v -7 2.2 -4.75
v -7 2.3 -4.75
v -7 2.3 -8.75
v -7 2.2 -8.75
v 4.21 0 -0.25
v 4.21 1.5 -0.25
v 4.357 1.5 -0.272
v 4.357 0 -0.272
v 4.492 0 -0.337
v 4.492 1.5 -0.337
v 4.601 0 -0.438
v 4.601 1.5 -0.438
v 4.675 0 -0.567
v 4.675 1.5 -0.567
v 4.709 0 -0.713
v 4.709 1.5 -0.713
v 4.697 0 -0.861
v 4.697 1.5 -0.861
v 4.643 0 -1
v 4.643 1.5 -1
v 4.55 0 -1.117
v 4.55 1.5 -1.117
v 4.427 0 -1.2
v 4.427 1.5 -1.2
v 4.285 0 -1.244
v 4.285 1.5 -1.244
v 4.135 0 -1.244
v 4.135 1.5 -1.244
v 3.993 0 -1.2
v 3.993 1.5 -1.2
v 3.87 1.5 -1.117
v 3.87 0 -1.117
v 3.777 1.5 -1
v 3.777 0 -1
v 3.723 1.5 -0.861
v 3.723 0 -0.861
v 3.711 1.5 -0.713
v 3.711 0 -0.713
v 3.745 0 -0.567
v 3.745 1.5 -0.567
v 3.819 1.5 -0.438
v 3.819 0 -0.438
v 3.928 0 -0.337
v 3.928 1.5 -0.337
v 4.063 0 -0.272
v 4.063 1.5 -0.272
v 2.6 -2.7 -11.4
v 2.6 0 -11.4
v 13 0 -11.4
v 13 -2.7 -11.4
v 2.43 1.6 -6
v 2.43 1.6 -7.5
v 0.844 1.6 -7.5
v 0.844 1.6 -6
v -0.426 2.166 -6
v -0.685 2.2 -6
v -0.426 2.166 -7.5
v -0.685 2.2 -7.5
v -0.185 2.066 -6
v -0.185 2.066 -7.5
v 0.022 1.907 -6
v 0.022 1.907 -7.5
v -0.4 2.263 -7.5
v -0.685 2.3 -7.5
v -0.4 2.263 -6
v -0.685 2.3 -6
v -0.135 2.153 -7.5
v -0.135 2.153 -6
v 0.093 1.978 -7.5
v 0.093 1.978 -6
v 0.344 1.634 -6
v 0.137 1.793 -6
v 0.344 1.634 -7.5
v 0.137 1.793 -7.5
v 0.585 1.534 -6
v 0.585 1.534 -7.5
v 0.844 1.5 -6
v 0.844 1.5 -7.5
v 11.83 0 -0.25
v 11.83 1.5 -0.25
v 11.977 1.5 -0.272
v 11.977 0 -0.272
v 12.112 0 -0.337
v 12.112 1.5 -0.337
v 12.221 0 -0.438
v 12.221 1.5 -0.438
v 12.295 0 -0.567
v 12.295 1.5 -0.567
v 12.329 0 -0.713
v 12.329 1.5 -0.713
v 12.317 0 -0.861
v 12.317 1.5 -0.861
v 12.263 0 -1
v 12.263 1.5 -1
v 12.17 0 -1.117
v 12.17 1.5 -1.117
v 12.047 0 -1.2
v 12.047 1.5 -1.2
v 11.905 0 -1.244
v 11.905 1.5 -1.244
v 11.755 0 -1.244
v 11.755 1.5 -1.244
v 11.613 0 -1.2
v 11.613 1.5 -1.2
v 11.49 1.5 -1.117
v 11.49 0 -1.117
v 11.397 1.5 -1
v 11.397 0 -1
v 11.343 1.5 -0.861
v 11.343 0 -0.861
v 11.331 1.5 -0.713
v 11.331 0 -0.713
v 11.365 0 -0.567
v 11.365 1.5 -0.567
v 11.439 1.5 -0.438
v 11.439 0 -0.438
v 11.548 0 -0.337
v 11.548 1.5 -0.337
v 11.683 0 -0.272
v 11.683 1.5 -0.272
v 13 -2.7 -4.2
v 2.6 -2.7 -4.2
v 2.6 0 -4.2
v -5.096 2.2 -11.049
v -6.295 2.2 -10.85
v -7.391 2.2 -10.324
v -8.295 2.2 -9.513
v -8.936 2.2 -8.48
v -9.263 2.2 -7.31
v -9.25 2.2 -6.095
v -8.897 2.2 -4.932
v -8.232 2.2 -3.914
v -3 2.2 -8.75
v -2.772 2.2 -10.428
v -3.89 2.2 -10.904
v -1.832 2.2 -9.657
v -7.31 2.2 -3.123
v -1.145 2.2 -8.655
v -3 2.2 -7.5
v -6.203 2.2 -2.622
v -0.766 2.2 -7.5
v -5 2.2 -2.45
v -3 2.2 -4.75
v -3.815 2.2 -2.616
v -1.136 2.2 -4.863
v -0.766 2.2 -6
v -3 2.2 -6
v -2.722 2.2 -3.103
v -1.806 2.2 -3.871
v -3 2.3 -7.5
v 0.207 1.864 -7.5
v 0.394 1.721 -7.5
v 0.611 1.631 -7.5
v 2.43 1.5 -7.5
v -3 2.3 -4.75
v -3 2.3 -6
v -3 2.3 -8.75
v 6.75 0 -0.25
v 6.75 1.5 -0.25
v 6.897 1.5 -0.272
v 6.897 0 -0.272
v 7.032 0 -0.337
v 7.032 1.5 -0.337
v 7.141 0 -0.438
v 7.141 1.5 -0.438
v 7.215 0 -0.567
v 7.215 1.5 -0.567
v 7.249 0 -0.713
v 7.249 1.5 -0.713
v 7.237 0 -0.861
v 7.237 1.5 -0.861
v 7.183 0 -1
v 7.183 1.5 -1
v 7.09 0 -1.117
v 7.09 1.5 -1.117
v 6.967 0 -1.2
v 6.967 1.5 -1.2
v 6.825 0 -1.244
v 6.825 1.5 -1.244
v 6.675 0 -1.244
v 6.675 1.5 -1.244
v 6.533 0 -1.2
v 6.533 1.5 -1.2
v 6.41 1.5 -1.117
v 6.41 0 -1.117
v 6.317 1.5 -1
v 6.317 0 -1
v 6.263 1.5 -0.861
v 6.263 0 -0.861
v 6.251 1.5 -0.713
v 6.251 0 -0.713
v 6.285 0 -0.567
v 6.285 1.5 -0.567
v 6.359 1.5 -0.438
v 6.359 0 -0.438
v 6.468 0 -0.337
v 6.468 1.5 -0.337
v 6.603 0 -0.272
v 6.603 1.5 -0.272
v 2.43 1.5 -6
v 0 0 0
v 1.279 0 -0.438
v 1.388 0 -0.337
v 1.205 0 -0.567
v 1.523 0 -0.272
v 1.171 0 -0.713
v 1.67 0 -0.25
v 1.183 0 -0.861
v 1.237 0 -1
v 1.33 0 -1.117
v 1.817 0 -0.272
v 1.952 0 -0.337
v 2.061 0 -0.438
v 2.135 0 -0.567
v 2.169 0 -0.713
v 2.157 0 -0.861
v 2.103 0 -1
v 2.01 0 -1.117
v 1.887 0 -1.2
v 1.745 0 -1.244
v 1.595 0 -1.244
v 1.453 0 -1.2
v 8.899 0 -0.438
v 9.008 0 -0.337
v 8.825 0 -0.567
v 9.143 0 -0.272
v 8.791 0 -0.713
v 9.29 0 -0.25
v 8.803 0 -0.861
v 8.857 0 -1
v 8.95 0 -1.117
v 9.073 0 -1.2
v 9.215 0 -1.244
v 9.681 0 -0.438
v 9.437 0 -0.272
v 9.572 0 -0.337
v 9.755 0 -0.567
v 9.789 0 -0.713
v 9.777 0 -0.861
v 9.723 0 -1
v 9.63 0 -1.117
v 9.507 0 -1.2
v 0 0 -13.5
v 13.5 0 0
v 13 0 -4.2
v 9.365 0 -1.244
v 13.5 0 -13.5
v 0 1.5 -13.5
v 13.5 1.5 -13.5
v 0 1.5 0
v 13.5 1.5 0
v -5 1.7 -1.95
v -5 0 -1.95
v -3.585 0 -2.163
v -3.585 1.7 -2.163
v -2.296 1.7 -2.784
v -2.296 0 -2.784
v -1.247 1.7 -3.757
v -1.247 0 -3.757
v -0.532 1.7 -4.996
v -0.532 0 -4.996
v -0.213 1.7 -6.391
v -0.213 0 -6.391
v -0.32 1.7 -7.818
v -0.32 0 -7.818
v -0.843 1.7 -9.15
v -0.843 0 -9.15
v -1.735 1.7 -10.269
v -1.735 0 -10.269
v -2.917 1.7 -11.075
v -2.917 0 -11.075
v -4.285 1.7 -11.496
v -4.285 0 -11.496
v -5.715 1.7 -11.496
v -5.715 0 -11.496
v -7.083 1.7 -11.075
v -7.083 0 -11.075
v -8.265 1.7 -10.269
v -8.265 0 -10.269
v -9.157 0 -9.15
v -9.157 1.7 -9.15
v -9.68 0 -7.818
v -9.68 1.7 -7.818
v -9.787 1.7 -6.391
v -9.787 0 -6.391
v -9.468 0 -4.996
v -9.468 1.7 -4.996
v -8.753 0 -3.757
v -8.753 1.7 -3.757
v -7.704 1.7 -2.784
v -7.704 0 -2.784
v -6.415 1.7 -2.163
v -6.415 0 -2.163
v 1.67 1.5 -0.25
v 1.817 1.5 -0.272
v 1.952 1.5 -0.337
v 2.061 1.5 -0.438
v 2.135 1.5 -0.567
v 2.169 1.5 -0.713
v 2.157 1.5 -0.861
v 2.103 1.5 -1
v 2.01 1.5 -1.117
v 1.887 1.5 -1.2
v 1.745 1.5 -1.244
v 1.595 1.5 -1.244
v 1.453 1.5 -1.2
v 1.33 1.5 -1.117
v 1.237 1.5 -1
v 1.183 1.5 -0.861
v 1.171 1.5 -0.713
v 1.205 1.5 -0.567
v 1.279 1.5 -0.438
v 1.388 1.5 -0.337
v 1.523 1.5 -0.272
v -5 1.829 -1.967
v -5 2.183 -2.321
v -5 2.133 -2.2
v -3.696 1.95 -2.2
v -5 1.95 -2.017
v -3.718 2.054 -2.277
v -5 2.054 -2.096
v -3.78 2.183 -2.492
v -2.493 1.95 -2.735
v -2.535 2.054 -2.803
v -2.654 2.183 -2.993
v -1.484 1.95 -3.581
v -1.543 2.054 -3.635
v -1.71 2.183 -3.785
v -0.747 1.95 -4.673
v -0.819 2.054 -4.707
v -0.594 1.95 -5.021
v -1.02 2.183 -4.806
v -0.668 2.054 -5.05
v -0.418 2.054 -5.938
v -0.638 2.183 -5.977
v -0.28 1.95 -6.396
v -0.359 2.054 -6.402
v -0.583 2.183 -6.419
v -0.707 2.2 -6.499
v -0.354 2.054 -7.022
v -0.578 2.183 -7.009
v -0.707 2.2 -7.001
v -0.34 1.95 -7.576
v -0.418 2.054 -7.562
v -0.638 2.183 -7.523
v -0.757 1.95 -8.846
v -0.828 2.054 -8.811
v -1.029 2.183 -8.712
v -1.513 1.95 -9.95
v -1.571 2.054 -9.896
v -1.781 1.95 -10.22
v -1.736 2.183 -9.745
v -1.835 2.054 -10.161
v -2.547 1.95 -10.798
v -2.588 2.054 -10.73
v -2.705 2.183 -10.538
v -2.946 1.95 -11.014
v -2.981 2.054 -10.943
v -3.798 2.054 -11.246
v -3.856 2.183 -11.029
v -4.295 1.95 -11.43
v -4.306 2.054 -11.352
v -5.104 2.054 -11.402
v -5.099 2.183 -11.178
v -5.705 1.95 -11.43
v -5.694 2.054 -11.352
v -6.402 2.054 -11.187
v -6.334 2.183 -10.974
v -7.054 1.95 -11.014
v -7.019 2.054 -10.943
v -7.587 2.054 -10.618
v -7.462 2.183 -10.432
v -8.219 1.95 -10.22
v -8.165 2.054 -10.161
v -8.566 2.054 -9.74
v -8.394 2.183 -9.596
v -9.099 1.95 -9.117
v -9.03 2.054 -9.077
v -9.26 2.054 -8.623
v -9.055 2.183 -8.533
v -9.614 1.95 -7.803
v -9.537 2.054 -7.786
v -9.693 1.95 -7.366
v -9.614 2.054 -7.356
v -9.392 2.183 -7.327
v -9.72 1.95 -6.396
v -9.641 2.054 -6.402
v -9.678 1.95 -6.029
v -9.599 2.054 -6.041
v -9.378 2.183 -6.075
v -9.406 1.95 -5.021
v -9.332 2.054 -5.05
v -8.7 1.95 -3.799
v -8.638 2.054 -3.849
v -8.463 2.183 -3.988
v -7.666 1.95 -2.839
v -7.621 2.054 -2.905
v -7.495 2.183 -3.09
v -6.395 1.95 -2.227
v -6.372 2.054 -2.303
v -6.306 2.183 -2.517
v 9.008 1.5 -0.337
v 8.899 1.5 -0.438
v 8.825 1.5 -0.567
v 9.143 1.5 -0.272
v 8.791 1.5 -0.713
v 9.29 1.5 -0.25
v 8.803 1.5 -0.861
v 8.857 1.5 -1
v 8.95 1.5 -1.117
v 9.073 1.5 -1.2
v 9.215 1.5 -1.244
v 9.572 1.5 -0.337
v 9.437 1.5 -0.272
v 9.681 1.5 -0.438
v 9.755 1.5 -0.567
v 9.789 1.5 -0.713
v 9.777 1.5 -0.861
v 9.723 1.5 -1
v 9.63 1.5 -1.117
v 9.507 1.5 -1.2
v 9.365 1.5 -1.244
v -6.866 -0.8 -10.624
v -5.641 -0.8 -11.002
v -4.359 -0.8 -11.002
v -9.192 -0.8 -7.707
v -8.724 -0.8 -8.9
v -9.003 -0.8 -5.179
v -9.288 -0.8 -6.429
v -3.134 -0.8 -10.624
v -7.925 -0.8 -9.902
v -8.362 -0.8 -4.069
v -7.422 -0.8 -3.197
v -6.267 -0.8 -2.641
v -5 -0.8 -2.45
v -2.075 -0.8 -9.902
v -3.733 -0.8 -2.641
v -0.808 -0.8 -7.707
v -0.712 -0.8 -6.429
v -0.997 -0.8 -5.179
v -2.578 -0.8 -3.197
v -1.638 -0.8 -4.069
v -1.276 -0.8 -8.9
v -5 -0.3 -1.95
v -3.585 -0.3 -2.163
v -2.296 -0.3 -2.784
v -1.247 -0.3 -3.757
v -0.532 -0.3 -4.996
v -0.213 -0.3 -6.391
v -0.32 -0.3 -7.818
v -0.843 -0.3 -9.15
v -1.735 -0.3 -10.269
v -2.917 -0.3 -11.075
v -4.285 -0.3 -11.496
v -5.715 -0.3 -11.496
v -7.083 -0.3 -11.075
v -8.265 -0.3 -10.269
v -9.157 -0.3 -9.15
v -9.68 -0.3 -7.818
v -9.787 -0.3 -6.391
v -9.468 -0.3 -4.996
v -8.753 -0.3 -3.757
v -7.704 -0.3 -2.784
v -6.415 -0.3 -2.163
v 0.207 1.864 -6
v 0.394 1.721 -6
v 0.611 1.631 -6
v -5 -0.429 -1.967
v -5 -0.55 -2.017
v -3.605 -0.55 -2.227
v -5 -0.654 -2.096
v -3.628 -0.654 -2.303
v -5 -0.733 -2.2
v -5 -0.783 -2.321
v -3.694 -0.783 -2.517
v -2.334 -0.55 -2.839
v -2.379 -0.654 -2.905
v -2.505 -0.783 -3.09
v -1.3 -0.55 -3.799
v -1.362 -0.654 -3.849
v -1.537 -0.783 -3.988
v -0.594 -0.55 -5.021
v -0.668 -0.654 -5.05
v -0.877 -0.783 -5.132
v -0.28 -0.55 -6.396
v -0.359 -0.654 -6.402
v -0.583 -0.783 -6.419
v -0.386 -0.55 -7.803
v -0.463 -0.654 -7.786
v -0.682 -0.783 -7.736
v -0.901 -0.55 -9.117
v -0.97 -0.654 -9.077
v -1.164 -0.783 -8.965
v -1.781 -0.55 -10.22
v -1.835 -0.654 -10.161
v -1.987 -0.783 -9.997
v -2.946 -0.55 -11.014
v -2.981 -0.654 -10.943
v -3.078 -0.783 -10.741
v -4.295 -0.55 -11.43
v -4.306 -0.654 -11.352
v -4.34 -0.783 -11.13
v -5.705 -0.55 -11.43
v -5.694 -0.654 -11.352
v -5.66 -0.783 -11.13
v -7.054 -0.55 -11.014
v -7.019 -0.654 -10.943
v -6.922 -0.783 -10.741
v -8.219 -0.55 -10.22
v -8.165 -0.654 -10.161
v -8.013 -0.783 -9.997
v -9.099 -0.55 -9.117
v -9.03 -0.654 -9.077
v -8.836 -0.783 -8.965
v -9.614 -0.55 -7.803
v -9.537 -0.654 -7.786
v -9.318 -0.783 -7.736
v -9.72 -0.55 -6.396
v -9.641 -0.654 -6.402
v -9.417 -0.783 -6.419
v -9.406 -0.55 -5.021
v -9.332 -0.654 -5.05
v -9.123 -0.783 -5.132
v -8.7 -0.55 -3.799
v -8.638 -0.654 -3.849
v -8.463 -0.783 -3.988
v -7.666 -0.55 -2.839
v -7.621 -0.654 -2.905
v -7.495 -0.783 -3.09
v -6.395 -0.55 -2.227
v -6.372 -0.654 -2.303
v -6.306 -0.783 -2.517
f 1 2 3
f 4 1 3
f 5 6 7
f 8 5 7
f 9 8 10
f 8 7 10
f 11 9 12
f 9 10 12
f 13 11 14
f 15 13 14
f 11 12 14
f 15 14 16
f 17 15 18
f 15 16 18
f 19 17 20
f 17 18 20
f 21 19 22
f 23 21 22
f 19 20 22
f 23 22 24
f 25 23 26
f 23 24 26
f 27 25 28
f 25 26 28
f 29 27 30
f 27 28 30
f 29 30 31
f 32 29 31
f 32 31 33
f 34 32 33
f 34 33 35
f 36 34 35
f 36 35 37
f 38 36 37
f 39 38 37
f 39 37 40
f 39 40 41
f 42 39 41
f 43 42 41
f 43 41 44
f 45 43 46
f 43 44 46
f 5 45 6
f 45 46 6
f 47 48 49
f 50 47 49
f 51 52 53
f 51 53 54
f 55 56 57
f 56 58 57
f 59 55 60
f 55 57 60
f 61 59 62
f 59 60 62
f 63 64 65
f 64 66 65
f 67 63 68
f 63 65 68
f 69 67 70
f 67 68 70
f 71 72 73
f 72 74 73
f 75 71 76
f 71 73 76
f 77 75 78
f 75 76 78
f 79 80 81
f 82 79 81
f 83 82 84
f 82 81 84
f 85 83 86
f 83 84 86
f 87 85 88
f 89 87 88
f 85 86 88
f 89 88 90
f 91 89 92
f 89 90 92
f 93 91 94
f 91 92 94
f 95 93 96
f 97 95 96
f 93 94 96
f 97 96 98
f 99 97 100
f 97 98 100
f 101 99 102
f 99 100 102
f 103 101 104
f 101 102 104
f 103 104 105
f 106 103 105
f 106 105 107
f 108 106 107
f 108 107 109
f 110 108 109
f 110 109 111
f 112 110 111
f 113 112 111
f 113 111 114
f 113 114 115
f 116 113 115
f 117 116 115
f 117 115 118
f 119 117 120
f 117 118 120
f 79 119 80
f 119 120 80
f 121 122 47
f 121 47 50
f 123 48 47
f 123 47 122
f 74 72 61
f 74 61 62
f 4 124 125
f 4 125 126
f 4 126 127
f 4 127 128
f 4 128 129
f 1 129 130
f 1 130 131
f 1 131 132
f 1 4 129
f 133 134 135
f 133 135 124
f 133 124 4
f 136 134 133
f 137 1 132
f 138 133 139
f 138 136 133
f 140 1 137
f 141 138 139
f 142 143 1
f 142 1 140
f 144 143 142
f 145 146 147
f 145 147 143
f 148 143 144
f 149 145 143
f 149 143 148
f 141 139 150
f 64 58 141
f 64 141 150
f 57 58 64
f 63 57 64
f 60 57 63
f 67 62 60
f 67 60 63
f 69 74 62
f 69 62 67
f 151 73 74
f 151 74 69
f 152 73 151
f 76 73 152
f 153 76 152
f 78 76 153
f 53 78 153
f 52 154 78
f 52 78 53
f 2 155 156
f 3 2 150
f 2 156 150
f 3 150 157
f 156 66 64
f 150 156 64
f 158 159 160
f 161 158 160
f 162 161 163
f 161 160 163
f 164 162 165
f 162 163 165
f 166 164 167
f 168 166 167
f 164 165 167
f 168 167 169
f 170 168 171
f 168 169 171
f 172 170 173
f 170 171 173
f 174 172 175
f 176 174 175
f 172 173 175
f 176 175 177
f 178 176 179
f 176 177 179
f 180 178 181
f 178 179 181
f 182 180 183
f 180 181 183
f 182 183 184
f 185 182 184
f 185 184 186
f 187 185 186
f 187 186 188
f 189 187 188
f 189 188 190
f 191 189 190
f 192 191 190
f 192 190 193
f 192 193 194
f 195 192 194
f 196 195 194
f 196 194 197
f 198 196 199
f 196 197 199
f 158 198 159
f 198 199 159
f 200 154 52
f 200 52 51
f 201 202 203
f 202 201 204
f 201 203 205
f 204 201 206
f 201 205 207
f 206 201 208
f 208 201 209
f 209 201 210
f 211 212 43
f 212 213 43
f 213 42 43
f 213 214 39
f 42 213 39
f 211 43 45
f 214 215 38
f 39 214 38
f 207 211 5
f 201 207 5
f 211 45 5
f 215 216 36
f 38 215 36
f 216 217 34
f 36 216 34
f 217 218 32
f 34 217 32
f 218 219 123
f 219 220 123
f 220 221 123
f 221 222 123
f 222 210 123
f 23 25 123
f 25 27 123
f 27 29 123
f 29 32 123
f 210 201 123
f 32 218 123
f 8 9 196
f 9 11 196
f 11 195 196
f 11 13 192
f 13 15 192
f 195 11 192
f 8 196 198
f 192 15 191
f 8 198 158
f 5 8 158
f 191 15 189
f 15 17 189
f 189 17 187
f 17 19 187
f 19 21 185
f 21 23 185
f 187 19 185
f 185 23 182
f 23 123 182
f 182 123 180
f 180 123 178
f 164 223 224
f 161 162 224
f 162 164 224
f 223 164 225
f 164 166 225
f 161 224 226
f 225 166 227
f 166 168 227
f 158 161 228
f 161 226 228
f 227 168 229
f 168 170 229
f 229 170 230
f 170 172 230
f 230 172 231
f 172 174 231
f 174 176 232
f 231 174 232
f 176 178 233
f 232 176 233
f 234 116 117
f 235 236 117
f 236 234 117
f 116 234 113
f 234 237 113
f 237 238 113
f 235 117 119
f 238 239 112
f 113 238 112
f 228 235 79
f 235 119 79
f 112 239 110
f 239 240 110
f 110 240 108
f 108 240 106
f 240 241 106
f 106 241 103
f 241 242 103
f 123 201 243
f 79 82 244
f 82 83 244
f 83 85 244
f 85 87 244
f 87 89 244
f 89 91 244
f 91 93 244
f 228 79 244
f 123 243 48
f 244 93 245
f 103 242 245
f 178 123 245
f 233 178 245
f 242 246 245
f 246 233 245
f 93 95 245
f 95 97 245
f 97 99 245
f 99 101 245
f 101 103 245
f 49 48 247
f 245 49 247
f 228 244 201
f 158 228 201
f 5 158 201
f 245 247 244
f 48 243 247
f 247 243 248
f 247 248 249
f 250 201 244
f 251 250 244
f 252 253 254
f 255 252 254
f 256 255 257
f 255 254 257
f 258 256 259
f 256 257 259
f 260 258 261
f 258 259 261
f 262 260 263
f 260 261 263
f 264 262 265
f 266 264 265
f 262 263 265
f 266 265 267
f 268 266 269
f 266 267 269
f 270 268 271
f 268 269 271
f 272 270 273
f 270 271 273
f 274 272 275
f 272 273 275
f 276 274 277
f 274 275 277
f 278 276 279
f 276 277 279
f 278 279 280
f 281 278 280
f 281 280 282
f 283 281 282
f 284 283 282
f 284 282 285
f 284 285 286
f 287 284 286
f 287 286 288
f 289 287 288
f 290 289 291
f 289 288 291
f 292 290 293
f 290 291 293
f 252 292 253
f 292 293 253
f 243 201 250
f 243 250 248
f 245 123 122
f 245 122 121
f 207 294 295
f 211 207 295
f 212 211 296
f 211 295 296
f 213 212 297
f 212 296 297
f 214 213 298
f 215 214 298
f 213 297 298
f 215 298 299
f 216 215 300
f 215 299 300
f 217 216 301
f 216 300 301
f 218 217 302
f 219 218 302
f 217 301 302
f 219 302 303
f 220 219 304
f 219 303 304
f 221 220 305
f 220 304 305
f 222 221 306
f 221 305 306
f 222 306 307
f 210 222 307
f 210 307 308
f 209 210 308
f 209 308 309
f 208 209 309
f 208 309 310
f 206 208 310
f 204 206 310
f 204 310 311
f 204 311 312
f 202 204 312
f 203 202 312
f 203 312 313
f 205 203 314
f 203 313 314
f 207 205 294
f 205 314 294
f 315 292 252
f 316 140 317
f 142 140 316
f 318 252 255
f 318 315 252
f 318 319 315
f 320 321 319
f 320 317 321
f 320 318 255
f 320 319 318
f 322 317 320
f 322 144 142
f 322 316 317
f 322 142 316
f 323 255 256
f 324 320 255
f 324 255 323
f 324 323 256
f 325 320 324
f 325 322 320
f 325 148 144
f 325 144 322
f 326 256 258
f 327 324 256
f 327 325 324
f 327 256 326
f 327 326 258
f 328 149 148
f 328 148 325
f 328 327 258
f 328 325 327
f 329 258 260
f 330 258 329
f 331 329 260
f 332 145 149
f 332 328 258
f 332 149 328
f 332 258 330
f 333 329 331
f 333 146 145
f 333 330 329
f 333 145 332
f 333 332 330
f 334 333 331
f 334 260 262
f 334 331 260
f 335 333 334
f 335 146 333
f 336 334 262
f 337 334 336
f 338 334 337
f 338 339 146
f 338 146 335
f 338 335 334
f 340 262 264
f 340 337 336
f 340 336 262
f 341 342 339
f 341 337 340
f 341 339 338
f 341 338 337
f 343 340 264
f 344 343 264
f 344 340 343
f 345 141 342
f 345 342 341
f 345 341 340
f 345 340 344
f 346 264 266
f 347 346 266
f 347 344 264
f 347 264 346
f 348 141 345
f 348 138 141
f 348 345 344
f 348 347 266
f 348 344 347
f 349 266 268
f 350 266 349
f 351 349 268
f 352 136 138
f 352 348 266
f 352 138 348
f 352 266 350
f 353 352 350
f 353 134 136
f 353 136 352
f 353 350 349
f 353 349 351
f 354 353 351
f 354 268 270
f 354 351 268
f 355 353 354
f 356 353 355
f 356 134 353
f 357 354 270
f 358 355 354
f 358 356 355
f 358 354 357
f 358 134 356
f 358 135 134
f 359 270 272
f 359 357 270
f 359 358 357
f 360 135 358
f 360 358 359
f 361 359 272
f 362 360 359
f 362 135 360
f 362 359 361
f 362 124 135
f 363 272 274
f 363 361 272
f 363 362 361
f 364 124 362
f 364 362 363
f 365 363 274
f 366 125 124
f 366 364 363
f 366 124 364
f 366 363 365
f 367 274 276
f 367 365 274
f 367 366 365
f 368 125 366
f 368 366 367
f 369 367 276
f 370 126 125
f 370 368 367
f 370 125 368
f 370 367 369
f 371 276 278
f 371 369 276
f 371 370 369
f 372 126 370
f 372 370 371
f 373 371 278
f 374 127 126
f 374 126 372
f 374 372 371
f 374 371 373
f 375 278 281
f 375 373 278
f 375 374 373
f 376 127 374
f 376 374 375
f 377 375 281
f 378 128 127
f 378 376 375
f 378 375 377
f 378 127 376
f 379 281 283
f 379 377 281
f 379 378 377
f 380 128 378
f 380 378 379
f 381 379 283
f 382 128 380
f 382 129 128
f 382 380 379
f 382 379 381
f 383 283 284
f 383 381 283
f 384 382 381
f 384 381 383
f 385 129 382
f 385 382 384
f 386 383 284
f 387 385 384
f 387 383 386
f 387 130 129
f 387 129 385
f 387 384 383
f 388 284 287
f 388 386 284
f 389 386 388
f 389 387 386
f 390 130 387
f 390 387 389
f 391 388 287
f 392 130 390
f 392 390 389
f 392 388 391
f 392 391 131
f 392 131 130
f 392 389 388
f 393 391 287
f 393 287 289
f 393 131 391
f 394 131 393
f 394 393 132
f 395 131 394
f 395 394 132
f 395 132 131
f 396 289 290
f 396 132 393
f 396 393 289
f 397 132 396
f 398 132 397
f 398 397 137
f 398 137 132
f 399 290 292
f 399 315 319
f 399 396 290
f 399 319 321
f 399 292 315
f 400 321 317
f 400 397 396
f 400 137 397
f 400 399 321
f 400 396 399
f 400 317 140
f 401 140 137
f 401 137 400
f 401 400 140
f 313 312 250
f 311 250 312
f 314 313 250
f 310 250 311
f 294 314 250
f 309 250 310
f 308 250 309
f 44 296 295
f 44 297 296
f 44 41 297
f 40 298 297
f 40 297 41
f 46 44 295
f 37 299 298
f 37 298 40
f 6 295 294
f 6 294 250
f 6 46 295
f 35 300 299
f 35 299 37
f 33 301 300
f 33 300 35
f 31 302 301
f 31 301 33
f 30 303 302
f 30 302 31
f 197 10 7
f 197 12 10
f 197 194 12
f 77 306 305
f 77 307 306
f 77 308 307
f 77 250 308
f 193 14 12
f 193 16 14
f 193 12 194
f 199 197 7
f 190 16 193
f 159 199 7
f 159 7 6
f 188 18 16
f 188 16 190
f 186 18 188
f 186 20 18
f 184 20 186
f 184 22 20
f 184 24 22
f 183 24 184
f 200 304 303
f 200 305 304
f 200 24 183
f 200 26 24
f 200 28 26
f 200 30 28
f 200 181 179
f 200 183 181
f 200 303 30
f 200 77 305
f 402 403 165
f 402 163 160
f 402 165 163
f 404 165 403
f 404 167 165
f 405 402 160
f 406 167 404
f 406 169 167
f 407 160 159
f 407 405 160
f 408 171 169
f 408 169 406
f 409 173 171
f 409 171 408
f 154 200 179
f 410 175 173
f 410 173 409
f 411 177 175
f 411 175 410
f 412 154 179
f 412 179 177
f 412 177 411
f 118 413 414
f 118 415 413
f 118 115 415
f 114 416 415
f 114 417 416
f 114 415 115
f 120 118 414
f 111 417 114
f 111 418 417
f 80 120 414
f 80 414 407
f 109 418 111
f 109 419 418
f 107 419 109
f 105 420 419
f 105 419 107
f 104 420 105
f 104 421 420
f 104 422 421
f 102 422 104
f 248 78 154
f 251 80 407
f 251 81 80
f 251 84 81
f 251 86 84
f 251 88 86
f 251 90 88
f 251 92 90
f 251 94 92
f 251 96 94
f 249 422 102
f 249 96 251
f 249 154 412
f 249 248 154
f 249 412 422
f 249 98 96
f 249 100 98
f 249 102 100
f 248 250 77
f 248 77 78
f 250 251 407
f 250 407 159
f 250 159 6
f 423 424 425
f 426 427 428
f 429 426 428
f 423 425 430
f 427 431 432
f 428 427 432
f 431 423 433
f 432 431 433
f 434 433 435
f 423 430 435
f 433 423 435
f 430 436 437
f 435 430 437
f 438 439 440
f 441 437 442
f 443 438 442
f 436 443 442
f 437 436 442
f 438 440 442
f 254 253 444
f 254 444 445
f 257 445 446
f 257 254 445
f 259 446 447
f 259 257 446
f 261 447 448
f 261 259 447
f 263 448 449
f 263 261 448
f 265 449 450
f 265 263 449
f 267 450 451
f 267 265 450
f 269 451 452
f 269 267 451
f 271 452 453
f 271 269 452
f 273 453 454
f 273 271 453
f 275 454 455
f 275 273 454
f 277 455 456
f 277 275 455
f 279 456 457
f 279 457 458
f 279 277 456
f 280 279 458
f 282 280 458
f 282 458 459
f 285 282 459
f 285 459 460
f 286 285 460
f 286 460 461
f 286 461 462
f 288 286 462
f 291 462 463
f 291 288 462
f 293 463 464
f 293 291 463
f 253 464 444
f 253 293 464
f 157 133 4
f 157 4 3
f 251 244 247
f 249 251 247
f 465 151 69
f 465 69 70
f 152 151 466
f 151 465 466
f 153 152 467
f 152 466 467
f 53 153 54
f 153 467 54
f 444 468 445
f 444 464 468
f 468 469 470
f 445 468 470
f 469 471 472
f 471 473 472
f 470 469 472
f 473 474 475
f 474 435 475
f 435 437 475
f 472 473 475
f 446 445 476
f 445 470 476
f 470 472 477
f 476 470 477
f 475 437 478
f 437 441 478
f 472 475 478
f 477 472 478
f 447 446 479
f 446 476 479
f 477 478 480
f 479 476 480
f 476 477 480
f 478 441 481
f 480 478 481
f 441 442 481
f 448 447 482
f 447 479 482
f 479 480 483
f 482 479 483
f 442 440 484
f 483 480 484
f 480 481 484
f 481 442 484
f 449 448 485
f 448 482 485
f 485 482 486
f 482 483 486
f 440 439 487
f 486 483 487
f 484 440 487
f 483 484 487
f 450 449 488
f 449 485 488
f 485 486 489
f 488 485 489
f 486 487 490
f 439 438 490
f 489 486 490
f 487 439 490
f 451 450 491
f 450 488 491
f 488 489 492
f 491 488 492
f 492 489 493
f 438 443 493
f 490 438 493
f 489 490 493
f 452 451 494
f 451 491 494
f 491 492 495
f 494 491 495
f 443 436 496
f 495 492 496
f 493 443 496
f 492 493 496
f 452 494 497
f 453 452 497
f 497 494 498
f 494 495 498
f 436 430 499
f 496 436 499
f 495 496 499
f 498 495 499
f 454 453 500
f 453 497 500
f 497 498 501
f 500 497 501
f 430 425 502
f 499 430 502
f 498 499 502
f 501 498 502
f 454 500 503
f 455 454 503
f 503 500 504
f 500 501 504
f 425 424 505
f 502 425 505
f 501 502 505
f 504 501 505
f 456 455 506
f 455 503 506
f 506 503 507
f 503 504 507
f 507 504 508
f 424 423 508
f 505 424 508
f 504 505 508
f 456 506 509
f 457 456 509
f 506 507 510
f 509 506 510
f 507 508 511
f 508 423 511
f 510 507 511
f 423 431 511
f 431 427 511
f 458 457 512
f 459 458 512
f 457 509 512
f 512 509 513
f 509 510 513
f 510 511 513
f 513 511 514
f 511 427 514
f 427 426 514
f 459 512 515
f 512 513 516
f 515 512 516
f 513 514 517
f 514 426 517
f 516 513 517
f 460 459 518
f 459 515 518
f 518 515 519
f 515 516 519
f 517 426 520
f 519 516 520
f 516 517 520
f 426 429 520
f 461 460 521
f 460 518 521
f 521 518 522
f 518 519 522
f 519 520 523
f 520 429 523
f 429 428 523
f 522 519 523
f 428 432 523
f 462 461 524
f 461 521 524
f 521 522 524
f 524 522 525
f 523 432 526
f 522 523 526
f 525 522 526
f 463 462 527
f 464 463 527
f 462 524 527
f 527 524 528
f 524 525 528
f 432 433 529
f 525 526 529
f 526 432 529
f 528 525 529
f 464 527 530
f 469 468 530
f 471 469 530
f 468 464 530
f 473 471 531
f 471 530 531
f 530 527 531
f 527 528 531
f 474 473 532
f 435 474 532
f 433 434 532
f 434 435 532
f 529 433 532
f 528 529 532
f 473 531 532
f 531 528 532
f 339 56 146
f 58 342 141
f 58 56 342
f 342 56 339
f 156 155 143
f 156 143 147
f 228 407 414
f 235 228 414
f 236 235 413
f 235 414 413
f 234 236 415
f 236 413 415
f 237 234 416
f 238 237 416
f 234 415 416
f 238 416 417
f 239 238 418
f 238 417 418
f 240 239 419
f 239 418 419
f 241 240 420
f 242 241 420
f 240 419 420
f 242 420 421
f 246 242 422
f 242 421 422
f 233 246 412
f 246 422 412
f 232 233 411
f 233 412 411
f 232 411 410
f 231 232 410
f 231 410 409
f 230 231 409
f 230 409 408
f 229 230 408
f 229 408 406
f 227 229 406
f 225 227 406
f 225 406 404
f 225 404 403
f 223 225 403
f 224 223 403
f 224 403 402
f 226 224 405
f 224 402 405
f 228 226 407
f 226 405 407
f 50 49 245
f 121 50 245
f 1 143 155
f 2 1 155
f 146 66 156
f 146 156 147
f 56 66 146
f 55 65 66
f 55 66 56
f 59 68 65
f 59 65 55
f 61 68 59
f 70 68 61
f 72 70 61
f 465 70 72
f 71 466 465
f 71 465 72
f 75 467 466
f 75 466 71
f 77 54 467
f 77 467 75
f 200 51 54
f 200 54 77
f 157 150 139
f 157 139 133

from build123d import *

# Parameters (mm, degrees)
SKETCH1_W           = 13.5
SKETCH1_H           = 13.5
BOSS_EXTRUDE1_DEPTH = 1.5
SKETCH2_R           = 0.5
CUT_EXTRUDE1_DEPTH  = 1.5
SKETCH3_R           = 4.8
BOSS_EXTRUDE2_DEPTH = 0.8
SKETCH4_R           = 4.8
BOSS_EXTRUDE3_DEPTH = 2.2
FILLET1_R           = 0.5
SKETCH5_W           = 10.4
SKETCH5_H           = 7.2
BOSS_EXTRUDE4_DEPTH = 2.7
SKETCH7_W           = 1.5
SKETCH7_H           = 0.1
SKETCH8_W           = 4
SKETCH8_H           = 0.1
BOSS_EXTRUDE5_DEPTH = 4


with BuildPart() as part:
    # Sketch1 → Boss-Extrude1 (new body)
    with BuildSketch(Plane(origin=(0, 0, 0), x_dir=(1, 0, 0), z_dir=(0, 1, 0))):
        with Locations((6.75, 6.75)):
            Rectangle(SKETCH1_W, SKETCH1_H)
    extrude(amount=BOSS_EXTRUDE1_DEPTH)

    # Sketch2 → Cut-Extrude1 (cut)
    with BuildSketch(Plane(origin=(0, 1.5, 0), x_dir=(1, 0, 0), z_dir=(0, 1, 0))):
        with Locations(Location((11.83, 0.75, 0), (0, 0, 270))):
            Circle(SKETCH2_R)
        with Locations(Location((9.29, 0.75, 0), (0, 0, 270))):
            Circle(SKETCH2_R)
        with Locations(Location((6.75, 0.75, 0), (0, 0, 270))):
            Circle(SKETCH2_R)
        with Locations(Location((4.21, 0.75, 0), (0, 0, 270))):
            Circle(SKETCH2_R)
        with Locations(Location((1.67, 0.75, 0), (0, 0, 270))):
            Circle(SKETCH2_R)
    extrude(amount=-CUT_EXTRUDE1_DEPTH, mode=Mode.SUBTRACT)

    # Sketch5 → Boss-Extrude4 (add)
    with BuildSketch(Plane.XZ):
        with Locations((7.8, -7.8)):
            Rectangle(SKETCH5_W, SKETCH5_H)
    extrude(amount=BOSS_EXTRUDE4_DEPTH)



with BuildPart() as body_2:
    # Sketch3 → Boss-Extrude2 (new body)
    with BuildSketch(Plane(origin=(0, 0, 0), x_dir=(1, 0, 0), z_dir=(0, 1, 0))):
        with Locations(Location((-5, 6.75, 0), (0, 0, 270))):
            Circle(SKETCH3_R)
    extrude(amount=-BOSS_EXTRUDE2_DEPTH)

    # Sketch4 → Boss-Extrude3 (add)
    with BuildSketch(Plane(origin=(0, 0, 0), x_dir=(1, 0, 0), z_dir=(0, 1, 0))):
        with Locations(Location((-5, 6.75, 0), (0, 0, 270))):
            Circle(SKETCH4_R)
    extrude(amount=BOSS_EXTRUDE3_DEPTH)

    # Fillet1
    fillet1_edges = [body_2.edges().sort_by_distance(p)[0] for p in [
        (-5, -0.8, -11.55),
        (-5, 2.2, -11.55),
    ]]
    fillet(fillet1_edges, radius=FILLET1_R)


with BuildPart() as part_1:
    add(part.part)

    add(body_2.part)  # Sweep1 merges body 2
    # Sweep1: sweep along a path in Sketch6
    with BuildLine(Plane.XY.offset(-6.75)) as sweep1_path:
        Line((-3, 2.2), (-0.684692448, 2.2))
        ThreePointArc((-0.684692448, 2.2), (-0.302009016, 2.123879533), (0.022414333, 1.907106781))
        Line((0.022414333, 1.907106781), (0.136627895, 1.792893219))
        ThreePointArc((0.136627895, 1.792893219), (0.461051244, 1.576120467), (0.843734676, 1.5))
        Line((0.843734676, 1.5), (2.429521114, 1.5))
    # Sketch7 → Sweep1 (sweep)
    with BuildSketch(Plane(origin=(-3, 0, 0), x_dir=(0, 0, -1), z_dir=(1, 0, 0))):
        with Locations((6.75, 2.25)):
            Rectangle(SKETCH7_W, SKETCH7_H)
    sweep(path=sweep1_path.line)

    # Sketch8 → Boss-Extrude5 (add)
    with BuildSketch(Plane(origin=(-3, 0, 0), x_dir=(0, 0, -1), z_dir=(1, 0, 0))):
        with Locations((6.75, 2.25)):
            Rectangle(SKETCH8_W, SKETCH8_H)
    extrude(amount=-BOSS_EXTRUDE5_DEPTH)


solid = part_1.part
